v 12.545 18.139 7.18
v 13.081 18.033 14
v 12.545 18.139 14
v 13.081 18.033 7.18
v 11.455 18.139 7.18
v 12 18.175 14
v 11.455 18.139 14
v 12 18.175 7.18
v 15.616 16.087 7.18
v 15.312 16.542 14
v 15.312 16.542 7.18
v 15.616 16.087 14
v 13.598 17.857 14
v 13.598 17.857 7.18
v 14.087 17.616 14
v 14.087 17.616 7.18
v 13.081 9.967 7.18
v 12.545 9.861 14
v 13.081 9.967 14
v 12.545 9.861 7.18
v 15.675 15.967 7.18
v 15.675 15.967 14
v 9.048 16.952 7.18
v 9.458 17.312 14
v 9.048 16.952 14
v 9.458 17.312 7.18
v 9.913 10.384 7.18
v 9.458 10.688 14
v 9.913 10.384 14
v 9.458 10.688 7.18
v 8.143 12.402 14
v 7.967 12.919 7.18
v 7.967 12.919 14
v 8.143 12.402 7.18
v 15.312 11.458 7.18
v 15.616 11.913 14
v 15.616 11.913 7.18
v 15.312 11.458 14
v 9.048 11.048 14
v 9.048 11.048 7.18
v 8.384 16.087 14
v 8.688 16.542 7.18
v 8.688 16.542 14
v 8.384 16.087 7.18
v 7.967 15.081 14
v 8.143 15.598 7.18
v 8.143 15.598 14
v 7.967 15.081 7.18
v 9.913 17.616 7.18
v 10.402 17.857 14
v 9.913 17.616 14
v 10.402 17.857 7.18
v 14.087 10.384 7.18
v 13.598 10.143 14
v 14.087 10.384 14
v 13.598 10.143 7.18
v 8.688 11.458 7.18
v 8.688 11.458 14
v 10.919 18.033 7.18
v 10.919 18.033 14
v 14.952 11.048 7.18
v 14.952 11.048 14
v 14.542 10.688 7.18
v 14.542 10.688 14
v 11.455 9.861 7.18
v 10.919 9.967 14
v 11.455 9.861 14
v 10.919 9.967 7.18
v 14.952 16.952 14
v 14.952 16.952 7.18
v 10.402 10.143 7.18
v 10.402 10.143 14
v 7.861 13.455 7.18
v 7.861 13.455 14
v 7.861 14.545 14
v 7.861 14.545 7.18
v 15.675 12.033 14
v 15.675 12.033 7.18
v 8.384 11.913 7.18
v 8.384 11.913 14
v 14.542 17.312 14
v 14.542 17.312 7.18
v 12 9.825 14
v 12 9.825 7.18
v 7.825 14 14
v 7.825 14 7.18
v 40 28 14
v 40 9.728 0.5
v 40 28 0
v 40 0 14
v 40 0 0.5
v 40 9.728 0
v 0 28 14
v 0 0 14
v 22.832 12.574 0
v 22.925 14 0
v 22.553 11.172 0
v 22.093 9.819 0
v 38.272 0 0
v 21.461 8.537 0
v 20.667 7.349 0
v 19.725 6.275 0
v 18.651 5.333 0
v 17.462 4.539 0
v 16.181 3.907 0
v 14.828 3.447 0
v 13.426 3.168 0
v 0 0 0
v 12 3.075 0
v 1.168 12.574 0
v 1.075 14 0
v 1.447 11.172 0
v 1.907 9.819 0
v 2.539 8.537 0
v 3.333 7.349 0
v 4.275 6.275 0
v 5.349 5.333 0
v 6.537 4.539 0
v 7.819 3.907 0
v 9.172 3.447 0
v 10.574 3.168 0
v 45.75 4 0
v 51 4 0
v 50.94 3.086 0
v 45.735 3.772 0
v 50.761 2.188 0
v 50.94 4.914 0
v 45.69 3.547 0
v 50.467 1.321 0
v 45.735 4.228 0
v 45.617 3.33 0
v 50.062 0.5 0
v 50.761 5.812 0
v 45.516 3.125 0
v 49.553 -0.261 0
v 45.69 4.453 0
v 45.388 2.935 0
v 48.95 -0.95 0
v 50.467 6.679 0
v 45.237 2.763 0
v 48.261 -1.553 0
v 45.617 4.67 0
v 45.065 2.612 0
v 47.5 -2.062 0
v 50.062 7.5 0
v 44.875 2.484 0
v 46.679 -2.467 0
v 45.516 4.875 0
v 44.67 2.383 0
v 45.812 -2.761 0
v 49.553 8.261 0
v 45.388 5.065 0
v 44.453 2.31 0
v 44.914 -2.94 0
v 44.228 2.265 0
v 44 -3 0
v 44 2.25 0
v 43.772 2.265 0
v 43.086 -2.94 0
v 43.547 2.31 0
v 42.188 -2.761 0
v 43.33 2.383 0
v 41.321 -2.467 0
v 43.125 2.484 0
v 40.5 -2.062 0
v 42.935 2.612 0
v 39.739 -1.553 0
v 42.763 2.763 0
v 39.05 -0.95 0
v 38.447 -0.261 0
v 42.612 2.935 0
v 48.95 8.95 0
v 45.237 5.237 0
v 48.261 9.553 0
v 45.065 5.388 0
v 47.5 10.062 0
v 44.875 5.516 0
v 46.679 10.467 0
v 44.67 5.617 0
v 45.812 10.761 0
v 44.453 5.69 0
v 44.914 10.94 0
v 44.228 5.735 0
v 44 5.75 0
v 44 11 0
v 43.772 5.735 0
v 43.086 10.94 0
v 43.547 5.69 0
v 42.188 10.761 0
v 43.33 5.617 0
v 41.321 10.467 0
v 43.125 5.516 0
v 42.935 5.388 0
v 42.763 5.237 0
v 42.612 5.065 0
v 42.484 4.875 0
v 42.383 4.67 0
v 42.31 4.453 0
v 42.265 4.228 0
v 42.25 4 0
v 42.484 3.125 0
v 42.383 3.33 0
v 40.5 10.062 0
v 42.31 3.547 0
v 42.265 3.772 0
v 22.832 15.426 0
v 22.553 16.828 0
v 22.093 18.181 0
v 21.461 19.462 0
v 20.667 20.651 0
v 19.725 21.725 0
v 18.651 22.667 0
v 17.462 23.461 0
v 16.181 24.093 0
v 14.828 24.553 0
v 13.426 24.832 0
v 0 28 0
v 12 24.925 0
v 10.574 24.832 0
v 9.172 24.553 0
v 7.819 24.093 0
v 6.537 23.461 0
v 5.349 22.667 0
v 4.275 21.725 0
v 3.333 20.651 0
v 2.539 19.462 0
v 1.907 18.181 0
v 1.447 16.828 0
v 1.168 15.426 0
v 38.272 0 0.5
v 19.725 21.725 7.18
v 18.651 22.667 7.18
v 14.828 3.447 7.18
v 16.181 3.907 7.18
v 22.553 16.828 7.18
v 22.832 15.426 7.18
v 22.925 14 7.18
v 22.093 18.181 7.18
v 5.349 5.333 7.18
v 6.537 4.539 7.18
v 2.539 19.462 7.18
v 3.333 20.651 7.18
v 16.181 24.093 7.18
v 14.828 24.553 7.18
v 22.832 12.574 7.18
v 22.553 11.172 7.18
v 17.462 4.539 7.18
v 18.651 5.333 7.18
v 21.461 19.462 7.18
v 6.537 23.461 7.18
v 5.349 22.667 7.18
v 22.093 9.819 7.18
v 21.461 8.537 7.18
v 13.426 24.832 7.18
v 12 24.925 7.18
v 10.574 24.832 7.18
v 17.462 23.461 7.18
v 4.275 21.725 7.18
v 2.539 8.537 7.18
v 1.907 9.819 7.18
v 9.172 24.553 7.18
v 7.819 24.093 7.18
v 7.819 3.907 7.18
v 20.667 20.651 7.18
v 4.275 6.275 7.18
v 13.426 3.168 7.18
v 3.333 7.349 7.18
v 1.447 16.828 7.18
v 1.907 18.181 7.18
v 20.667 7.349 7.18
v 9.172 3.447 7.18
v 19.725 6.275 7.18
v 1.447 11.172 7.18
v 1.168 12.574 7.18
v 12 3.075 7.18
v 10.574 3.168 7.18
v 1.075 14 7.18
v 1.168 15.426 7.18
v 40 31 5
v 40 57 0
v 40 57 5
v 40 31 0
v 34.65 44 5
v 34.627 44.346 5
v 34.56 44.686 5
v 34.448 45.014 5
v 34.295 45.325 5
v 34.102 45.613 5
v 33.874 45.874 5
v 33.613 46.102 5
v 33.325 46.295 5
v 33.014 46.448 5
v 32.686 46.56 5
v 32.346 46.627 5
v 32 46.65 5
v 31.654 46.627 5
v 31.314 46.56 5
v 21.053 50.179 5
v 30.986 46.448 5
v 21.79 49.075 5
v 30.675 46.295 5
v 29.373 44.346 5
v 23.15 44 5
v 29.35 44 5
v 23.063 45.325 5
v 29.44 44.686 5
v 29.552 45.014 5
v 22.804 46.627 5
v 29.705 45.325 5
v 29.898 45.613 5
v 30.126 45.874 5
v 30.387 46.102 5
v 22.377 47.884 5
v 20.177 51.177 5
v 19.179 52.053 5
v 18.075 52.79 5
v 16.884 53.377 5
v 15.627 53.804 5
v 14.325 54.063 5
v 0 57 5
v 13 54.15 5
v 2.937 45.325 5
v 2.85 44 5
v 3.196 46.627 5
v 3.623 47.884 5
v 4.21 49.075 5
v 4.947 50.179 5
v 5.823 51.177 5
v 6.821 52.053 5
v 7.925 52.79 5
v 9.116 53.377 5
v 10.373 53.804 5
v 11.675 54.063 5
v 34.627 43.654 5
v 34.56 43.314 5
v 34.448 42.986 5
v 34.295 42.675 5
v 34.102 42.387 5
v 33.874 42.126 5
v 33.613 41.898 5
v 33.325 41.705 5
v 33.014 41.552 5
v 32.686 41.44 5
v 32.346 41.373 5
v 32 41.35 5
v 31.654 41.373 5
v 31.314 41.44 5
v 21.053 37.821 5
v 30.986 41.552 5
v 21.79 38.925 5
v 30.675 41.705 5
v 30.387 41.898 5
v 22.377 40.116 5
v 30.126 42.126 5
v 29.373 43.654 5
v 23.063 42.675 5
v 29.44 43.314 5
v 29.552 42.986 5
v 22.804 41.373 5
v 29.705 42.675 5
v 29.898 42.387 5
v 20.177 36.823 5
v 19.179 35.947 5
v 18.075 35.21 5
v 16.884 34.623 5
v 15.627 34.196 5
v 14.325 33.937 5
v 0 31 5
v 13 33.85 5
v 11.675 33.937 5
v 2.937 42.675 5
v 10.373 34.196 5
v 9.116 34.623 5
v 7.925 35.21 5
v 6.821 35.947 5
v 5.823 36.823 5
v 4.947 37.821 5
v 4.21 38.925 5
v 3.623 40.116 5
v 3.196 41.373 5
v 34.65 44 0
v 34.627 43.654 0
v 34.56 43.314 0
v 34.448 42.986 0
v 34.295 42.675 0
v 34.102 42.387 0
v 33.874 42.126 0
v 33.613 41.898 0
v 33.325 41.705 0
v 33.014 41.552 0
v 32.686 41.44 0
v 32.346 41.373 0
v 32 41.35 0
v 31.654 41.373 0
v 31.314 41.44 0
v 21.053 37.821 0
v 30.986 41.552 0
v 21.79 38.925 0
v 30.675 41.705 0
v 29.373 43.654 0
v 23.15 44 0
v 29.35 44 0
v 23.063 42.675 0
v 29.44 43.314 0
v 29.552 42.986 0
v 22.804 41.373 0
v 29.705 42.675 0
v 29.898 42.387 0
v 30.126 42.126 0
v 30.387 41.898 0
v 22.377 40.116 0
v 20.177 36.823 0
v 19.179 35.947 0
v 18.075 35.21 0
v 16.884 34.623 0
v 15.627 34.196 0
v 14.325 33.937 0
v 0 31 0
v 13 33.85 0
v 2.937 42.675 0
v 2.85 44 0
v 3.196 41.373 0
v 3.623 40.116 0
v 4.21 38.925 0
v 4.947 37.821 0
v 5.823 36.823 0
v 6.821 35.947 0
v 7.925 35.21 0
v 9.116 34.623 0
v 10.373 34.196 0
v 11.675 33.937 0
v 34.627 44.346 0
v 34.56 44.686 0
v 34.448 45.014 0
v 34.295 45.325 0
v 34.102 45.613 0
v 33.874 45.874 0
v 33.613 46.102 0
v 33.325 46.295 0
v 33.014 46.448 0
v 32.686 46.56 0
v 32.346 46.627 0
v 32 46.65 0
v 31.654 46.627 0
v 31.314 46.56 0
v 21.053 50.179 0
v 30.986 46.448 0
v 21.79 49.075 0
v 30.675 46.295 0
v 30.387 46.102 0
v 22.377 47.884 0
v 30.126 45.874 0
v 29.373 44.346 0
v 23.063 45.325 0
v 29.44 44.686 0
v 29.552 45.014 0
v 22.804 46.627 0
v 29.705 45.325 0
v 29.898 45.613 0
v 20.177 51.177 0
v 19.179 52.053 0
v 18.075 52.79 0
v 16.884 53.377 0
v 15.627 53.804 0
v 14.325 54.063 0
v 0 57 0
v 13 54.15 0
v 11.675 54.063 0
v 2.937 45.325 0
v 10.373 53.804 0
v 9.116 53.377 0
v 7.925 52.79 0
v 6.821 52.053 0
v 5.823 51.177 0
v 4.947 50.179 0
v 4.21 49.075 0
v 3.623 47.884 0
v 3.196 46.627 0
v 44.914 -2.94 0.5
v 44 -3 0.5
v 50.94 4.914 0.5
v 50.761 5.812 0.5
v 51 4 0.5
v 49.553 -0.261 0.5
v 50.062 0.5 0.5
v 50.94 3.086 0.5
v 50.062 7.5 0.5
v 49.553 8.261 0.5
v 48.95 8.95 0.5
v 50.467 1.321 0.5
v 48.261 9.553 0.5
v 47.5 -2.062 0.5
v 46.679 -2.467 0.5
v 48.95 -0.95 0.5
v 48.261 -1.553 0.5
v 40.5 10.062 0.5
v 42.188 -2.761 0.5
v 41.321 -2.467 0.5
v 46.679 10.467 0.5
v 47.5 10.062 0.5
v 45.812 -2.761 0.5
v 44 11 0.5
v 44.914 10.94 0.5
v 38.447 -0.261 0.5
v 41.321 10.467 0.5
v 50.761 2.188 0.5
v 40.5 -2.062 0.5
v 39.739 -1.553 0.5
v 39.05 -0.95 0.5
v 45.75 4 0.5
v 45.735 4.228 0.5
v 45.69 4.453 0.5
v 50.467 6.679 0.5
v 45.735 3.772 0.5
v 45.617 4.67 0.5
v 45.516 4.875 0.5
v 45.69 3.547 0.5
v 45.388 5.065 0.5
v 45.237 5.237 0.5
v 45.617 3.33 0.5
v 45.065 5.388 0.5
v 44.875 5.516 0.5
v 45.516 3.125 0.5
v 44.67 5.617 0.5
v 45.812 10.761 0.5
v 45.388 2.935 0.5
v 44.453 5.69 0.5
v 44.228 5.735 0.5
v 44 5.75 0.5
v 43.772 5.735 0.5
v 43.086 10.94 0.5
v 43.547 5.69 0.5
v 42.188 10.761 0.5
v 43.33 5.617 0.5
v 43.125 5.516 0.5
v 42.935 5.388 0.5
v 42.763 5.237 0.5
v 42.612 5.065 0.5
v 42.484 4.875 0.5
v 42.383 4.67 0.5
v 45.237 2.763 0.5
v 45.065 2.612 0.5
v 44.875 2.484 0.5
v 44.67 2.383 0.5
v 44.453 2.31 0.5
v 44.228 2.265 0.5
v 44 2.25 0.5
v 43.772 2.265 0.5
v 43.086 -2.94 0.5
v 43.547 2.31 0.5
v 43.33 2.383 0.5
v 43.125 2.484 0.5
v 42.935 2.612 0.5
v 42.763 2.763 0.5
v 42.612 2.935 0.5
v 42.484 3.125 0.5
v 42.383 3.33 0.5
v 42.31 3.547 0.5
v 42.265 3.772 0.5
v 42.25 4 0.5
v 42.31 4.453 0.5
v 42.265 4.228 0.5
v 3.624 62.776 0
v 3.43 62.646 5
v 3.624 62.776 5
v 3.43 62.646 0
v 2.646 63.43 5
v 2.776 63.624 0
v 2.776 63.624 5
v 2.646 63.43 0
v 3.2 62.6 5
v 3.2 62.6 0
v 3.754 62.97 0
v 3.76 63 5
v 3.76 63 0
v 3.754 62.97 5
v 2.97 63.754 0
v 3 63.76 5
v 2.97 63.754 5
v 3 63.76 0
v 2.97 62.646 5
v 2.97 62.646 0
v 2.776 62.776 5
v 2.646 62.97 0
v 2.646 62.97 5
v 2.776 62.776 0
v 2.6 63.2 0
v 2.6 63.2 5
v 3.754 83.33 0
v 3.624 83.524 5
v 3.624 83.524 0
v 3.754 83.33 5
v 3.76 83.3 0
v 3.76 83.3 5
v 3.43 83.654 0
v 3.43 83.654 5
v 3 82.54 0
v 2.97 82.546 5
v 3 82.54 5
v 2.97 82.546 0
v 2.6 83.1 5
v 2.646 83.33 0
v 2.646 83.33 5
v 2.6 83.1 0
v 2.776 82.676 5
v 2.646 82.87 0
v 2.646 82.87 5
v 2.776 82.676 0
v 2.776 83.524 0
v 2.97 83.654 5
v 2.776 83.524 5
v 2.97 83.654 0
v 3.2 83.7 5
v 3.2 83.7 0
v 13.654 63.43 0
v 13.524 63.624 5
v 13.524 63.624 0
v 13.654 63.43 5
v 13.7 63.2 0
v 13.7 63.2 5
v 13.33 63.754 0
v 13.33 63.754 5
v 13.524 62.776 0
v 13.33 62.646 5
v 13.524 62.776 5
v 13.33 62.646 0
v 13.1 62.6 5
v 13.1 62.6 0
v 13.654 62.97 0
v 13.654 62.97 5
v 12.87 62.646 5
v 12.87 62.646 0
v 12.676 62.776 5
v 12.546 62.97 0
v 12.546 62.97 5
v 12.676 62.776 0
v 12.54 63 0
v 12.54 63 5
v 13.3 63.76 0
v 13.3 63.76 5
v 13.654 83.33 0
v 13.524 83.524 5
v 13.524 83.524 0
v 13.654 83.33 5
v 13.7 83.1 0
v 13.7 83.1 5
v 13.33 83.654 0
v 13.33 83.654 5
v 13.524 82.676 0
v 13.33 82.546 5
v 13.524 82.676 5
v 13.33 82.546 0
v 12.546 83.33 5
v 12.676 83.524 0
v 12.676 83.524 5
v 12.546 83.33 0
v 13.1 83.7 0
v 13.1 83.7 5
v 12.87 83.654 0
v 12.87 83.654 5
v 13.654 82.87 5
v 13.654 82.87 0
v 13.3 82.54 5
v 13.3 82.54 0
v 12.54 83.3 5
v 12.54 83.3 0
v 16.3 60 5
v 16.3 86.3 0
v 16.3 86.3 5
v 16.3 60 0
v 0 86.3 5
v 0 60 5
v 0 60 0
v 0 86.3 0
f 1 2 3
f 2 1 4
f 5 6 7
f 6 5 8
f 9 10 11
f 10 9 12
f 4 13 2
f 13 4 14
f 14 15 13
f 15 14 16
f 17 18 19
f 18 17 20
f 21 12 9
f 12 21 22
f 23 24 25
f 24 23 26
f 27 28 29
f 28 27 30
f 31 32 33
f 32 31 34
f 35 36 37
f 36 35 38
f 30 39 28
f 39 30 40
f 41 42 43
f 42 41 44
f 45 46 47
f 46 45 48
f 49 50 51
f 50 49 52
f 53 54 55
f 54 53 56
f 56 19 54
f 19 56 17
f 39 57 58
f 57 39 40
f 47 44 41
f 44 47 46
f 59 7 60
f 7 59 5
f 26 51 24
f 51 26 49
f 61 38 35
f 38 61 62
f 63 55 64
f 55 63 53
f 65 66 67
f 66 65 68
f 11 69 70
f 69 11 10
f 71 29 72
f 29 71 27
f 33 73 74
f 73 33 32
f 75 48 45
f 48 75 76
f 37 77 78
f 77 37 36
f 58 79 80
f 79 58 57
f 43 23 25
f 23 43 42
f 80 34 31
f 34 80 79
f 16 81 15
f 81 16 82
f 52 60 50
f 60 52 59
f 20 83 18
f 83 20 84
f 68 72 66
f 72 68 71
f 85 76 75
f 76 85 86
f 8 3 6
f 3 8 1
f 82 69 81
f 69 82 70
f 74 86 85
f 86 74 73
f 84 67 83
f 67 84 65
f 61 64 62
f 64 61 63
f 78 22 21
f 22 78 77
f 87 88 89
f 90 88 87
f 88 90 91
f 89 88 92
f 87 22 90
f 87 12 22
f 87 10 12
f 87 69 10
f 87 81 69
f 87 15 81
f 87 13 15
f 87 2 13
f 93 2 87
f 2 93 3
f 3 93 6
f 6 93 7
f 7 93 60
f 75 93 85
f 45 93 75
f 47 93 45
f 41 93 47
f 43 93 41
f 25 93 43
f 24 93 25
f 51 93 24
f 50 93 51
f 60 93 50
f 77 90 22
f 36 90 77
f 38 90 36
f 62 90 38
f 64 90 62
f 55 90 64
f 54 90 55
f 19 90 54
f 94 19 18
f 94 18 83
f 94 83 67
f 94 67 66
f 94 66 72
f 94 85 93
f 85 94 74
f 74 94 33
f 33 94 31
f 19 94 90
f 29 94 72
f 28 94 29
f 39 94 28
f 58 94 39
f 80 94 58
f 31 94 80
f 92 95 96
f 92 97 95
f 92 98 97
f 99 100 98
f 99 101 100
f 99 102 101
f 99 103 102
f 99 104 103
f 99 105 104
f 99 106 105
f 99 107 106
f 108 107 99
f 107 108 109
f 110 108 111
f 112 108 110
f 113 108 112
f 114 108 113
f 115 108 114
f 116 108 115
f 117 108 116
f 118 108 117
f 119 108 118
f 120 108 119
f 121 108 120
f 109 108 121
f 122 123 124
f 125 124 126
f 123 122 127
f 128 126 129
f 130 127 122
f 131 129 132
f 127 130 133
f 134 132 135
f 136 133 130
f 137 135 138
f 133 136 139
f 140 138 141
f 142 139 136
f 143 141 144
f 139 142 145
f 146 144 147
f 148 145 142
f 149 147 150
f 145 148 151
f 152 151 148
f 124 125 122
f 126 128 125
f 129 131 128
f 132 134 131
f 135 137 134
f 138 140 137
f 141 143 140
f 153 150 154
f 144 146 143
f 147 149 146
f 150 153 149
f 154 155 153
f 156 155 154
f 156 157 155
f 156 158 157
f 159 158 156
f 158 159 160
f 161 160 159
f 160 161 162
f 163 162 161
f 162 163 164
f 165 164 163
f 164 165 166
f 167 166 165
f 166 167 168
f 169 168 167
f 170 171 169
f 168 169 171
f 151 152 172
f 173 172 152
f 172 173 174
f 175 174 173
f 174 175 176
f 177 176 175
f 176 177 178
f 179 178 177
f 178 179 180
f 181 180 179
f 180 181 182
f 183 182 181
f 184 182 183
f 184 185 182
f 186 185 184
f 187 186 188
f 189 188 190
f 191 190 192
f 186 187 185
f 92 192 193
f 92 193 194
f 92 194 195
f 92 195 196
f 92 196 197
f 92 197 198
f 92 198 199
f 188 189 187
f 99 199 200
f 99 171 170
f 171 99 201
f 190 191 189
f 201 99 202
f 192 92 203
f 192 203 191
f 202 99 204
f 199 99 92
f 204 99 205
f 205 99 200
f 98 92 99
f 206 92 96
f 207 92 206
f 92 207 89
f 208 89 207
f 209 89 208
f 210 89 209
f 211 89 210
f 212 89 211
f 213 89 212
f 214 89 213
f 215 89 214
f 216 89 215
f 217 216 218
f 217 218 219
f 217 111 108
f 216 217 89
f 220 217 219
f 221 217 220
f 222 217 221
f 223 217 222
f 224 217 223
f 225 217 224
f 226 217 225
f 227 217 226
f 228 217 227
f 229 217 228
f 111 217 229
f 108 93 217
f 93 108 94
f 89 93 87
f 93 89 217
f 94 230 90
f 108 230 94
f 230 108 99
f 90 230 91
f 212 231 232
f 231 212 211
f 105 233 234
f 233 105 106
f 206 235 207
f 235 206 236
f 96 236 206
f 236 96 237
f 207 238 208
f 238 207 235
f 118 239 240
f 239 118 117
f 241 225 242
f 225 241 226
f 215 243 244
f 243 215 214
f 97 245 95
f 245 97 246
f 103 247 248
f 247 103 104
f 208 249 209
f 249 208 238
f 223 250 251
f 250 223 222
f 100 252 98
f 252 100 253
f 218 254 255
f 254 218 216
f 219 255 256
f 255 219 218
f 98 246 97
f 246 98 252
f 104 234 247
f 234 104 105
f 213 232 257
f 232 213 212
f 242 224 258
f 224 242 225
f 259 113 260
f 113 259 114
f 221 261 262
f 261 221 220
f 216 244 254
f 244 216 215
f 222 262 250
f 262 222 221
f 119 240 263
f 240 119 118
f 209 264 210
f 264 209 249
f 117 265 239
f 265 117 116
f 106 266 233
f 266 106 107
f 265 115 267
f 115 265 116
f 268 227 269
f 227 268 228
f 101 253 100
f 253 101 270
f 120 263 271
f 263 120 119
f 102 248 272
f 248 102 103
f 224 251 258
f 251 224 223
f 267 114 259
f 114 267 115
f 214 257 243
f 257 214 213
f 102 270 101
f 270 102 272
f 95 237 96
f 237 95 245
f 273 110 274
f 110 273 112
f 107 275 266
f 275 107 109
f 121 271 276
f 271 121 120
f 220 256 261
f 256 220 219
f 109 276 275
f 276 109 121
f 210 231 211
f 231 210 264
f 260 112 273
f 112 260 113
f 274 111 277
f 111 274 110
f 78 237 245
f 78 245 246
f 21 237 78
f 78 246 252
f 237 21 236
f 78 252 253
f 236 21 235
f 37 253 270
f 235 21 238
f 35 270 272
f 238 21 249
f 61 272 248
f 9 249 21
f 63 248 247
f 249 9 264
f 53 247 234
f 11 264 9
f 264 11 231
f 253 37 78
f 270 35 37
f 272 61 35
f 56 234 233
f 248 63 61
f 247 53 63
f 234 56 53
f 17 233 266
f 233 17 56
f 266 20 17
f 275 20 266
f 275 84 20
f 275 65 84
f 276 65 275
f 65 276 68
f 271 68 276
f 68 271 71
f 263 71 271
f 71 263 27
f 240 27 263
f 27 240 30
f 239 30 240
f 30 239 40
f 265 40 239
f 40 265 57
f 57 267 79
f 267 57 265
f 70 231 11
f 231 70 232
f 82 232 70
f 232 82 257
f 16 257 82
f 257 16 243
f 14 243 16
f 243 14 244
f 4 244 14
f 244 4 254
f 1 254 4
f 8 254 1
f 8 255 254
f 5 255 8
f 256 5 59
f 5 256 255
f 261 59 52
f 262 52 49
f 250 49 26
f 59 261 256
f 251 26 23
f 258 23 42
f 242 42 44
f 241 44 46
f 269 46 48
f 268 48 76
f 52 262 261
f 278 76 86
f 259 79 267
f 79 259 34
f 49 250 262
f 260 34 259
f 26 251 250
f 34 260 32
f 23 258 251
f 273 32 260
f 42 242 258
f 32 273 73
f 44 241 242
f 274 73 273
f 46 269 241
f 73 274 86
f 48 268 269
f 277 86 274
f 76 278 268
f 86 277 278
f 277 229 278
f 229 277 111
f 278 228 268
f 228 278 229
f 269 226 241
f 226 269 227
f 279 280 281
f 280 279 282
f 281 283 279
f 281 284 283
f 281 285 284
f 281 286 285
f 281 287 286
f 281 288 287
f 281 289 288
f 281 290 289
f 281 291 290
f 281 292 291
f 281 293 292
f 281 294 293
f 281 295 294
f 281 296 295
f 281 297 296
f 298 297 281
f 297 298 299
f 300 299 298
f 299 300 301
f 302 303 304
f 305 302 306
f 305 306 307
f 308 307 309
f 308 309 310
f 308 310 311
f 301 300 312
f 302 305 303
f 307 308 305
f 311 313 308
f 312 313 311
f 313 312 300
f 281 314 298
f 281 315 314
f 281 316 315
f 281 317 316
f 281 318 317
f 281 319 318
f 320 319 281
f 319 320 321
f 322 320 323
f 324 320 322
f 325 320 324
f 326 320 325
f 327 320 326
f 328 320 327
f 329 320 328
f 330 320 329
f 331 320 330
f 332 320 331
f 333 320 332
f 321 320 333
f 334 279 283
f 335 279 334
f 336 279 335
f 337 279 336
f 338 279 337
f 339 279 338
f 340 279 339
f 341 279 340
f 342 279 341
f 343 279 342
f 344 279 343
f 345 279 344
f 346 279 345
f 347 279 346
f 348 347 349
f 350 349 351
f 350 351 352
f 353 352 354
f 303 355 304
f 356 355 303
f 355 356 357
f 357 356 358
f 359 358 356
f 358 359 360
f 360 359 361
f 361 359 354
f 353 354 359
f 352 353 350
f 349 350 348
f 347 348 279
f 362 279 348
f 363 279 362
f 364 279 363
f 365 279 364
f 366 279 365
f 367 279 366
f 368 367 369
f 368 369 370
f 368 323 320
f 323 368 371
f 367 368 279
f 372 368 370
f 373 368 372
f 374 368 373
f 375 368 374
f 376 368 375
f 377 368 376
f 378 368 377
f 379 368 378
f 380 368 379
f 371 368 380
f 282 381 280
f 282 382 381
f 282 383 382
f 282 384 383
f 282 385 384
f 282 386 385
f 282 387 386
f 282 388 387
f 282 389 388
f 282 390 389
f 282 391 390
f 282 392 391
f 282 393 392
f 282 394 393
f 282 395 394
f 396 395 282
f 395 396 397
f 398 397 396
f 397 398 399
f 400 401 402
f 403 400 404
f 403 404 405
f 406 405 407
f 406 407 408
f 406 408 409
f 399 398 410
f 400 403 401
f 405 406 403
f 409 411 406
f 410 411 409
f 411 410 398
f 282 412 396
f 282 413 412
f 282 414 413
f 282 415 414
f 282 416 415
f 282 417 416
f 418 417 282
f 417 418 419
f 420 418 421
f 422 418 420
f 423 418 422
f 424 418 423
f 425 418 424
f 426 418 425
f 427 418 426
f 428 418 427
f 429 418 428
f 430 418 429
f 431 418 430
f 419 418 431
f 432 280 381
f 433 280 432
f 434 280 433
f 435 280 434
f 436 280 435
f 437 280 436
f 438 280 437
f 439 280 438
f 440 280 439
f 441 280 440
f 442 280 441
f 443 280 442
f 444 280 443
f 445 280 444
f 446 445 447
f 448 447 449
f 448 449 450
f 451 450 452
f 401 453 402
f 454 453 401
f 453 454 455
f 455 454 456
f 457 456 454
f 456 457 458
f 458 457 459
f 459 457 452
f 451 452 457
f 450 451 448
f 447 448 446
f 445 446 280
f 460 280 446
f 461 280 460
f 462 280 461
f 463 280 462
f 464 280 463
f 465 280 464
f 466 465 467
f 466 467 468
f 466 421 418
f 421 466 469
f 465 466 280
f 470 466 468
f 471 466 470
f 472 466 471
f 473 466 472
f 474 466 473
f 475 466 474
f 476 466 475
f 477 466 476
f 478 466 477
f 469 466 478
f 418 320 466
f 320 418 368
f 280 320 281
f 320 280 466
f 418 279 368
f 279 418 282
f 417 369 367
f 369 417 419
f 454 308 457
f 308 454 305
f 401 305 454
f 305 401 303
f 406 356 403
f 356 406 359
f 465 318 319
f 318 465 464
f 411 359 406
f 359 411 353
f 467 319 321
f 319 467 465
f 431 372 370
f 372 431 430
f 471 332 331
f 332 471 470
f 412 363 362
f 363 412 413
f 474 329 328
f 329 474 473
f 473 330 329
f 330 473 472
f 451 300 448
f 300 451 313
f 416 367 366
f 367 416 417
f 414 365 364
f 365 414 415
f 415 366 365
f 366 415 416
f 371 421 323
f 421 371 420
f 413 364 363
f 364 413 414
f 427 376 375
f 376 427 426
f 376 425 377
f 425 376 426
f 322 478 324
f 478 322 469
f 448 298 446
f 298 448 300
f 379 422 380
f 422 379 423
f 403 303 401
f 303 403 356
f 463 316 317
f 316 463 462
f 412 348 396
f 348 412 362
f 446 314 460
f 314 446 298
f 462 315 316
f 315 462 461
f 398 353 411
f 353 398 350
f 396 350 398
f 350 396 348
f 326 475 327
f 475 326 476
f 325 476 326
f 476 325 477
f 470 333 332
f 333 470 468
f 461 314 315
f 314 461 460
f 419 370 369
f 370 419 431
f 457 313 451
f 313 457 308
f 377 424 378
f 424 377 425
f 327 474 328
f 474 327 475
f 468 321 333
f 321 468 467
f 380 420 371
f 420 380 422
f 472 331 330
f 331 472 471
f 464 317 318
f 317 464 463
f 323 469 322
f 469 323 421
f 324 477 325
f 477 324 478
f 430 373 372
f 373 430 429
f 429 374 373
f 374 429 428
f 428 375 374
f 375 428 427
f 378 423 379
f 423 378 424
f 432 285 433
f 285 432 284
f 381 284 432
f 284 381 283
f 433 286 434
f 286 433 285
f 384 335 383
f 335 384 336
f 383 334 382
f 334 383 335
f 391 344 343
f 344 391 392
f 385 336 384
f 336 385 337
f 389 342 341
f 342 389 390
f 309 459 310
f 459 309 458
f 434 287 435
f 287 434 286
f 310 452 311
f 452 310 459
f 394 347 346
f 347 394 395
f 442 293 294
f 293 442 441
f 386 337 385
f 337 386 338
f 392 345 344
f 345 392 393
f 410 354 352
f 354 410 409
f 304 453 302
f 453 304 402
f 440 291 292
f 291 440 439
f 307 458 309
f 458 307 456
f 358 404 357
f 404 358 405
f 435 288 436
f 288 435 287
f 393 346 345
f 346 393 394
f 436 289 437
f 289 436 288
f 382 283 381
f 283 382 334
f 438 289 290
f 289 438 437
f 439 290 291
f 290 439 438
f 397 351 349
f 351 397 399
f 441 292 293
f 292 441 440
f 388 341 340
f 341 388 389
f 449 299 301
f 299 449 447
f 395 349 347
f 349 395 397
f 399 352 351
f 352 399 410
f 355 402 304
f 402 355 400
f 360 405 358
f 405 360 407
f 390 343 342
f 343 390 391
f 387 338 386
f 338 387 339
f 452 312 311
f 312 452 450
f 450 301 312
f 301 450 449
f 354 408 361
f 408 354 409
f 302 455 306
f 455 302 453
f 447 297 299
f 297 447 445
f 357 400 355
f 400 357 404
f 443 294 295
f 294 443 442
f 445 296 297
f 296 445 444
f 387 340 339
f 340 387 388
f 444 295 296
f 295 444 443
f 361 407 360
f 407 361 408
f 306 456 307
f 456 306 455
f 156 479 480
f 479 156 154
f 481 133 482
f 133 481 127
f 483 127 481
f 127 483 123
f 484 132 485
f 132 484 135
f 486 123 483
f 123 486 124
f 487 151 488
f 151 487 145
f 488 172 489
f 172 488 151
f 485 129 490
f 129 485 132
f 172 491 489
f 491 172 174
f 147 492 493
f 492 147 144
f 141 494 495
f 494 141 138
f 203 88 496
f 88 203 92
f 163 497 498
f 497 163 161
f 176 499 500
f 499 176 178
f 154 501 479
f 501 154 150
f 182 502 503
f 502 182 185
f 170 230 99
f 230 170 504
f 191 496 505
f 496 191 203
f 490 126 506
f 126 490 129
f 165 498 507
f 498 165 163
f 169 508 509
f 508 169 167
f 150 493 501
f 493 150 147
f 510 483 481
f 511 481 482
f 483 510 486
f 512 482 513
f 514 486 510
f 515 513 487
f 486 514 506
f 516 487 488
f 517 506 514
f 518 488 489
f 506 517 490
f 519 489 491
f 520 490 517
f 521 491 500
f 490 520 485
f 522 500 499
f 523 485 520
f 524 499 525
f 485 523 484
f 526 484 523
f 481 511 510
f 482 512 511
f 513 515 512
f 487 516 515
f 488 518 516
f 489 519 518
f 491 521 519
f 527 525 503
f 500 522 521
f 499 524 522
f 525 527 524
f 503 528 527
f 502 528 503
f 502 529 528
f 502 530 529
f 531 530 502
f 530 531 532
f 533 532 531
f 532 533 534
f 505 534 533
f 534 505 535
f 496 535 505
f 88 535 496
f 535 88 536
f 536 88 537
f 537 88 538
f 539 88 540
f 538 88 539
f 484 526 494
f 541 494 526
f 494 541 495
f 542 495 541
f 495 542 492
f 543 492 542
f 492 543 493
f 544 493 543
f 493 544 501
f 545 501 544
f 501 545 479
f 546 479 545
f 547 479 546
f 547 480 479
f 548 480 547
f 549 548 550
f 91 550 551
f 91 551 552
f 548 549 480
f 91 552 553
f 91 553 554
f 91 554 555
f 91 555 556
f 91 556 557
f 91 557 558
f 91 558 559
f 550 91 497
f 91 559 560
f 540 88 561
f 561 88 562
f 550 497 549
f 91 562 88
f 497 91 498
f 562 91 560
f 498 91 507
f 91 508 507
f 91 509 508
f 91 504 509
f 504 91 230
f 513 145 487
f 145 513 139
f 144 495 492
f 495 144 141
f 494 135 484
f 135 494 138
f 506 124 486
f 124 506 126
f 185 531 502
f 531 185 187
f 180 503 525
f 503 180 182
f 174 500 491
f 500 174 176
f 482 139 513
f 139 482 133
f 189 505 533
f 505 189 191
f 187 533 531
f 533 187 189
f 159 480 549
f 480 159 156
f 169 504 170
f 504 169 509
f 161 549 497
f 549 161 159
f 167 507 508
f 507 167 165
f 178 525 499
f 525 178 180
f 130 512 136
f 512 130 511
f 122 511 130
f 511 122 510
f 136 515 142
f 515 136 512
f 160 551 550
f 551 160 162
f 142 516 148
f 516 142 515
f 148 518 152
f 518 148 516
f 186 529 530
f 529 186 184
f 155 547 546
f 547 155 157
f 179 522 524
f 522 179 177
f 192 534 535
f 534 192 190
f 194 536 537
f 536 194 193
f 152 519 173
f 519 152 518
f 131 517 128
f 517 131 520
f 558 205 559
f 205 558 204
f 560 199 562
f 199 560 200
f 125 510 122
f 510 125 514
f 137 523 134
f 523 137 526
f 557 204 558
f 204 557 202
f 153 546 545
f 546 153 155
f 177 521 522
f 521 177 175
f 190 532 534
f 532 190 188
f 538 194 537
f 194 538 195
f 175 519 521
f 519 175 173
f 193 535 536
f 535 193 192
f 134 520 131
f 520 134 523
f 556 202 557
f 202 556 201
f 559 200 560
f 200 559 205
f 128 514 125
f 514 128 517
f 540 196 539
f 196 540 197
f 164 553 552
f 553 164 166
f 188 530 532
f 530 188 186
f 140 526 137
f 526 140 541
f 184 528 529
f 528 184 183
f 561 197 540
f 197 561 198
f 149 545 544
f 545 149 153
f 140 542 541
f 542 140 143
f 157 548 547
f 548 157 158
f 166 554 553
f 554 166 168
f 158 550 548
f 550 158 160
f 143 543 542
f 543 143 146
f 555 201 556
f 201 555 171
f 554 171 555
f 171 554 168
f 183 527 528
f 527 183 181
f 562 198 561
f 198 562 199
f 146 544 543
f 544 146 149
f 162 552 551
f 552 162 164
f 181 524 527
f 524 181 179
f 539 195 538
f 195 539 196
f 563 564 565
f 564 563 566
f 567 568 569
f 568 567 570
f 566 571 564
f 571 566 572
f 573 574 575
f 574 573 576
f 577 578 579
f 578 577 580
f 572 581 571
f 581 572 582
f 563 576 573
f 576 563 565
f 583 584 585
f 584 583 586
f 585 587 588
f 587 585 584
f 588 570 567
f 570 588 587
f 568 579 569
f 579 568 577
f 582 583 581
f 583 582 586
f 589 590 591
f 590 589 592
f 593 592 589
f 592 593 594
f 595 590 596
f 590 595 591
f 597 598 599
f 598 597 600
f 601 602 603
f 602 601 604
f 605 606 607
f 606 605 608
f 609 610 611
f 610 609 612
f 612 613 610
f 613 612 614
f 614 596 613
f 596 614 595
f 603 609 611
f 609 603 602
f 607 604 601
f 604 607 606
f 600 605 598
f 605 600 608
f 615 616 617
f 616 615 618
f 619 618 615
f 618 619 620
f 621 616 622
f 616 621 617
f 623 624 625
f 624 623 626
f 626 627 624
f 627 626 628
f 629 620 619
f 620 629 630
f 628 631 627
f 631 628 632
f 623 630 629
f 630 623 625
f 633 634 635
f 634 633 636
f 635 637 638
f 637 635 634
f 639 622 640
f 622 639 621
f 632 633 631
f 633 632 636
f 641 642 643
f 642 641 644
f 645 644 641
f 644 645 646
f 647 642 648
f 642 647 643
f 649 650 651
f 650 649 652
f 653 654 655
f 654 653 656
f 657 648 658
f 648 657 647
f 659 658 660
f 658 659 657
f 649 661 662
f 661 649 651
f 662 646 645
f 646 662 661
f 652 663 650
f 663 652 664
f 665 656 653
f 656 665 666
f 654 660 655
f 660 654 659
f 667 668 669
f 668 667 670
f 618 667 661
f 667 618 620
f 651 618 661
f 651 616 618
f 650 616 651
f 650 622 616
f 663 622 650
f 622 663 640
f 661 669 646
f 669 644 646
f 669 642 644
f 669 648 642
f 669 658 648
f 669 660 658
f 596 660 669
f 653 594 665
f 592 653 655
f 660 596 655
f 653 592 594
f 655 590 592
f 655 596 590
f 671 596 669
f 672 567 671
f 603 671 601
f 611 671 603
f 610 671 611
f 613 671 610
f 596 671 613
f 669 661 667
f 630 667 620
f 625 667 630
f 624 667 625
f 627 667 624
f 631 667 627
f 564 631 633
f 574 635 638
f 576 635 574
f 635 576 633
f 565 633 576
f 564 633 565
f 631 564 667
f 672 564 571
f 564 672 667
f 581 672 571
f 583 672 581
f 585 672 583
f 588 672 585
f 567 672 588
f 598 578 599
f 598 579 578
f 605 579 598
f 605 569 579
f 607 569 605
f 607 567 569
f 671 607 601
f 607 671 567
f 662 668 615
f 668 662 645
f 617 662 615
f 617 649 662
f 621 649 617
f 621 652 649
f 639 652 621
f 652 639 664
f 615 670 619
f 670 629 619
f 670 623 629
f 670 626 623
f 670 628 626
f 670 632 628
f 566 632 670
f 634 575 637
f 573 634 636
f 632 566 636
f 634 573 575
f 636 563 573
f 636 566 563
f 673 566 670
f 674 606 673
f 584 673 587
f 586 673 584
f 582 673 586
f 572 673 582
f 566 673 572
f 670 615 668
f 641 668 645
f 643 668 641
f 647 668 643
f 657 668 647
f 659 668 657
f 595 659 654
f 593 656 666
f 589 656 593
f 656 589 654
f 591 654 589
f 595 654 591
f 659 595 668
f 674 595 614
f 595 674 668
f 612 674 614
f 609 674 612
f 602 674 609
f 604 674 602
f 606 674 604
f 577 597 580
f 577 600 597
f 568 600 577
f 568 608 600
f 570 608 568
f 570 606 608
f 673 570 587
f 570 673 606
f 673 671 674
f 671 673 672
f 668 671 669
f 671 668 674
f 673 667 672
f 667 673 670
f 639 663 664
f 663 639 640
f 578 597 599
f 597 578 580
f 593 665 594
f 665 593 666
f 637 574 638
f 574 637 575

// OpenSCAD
// Gen-CJ — fit coupon: O20/O5 THROUGH pockets at carrier thickness (test on a steel offcut), 608 seat,
// D-flat bore, gap shim, and one bobbin-bay slice (bobbin footprint + bay_clear) to test former fit.
include <parameters.scad>;
$fn = 48;
// D-flat keyed bore: flat faces +X (angle 0 = magnet pocket 0 = index notch)
module dflat_bore(h) {
    intersection() {
        cylinder(d=shaft_bore, h=h);
        translate([-shaft_bore, -shaft_bore, 0]) cube([shaft_bore + dflat_x, 2*shaft_bore, h]);
    }
}
module sector_2d(r_in, r_out, ang) {
    polygon([
        for (a = [-ang/2 : ang/24 : ang/2]) [r_in*cos(a), r_in*sin(a)],
        for (a = [ang/2 : -ang/24 : -ang/2]) [r_out*cos(a), r_out*sin(a)]
    ]);
}
module footprint_2d() { offset(r=wall) sector_2d(coil_id_r, coil_od_r, span_deg); }
module hub_2d()       { offset(delta=-coil_core_inset) sector_2d(coil_id_r, coil_od_r, span_deg); }

block_w = 40; block_d = 28; block_h = 14;
difference() {
    cube([block_w, block_d, block_h]);
    translate([12, block_d/2, -0.02]) cylinder(d=bearing_d, h=bearing_h);
    translate([12, block_d/2, -0.1]) dflat_bore(block_h + 1);
}
translate([0, block_d + 3, 0]) difference() {
    cube([40, 26, carrier_thick]);
    translate([13, 13, -0.1]) cylinder(d=large_pocket_d, h=carrier_thick + 0.2);
    translate([32, 13, -0.1]) cylinder(d=small_pocket_d, h=carrier_thick + 0.2);
}
translate([block_w + 4, 4, 0])
    difference() {
        cylinder(d=spacer_pad_od, h=gap_spacer_h);
        translate([0, 0, -0.1]) cylinder(d=spacer_pad_id, h=gap_spacer_h + 0.2);
    }
// N42 20x10x5 BLOCK through-pocket test (block + block_pocket_clear, 1.2 mm corner reliefs), 2026-10-16
translate([0, block_d + 3 + 26 + 3, 0]) difference() {
    cube([block_tangential + block_pocket_clear + 6, block_radial + block_pocket_clear + 6, carrier_thick]);
    translate([3, 3, -0.1]) cube([block_tangential + block_pocket_clear, block_radial + block_pocket_clear, carrier_thick + 0.2]);
    for (x = [3.2, 3 + block_tangential + block_pocket_clear - 0.2], y = [3.2, 3 + block_radial + block_pocket_clear - 0.2])
        translate([x, y, -0.1]) cylinder(d=1.2, h=carrier_thick + 0.2, $fn=16);
}
